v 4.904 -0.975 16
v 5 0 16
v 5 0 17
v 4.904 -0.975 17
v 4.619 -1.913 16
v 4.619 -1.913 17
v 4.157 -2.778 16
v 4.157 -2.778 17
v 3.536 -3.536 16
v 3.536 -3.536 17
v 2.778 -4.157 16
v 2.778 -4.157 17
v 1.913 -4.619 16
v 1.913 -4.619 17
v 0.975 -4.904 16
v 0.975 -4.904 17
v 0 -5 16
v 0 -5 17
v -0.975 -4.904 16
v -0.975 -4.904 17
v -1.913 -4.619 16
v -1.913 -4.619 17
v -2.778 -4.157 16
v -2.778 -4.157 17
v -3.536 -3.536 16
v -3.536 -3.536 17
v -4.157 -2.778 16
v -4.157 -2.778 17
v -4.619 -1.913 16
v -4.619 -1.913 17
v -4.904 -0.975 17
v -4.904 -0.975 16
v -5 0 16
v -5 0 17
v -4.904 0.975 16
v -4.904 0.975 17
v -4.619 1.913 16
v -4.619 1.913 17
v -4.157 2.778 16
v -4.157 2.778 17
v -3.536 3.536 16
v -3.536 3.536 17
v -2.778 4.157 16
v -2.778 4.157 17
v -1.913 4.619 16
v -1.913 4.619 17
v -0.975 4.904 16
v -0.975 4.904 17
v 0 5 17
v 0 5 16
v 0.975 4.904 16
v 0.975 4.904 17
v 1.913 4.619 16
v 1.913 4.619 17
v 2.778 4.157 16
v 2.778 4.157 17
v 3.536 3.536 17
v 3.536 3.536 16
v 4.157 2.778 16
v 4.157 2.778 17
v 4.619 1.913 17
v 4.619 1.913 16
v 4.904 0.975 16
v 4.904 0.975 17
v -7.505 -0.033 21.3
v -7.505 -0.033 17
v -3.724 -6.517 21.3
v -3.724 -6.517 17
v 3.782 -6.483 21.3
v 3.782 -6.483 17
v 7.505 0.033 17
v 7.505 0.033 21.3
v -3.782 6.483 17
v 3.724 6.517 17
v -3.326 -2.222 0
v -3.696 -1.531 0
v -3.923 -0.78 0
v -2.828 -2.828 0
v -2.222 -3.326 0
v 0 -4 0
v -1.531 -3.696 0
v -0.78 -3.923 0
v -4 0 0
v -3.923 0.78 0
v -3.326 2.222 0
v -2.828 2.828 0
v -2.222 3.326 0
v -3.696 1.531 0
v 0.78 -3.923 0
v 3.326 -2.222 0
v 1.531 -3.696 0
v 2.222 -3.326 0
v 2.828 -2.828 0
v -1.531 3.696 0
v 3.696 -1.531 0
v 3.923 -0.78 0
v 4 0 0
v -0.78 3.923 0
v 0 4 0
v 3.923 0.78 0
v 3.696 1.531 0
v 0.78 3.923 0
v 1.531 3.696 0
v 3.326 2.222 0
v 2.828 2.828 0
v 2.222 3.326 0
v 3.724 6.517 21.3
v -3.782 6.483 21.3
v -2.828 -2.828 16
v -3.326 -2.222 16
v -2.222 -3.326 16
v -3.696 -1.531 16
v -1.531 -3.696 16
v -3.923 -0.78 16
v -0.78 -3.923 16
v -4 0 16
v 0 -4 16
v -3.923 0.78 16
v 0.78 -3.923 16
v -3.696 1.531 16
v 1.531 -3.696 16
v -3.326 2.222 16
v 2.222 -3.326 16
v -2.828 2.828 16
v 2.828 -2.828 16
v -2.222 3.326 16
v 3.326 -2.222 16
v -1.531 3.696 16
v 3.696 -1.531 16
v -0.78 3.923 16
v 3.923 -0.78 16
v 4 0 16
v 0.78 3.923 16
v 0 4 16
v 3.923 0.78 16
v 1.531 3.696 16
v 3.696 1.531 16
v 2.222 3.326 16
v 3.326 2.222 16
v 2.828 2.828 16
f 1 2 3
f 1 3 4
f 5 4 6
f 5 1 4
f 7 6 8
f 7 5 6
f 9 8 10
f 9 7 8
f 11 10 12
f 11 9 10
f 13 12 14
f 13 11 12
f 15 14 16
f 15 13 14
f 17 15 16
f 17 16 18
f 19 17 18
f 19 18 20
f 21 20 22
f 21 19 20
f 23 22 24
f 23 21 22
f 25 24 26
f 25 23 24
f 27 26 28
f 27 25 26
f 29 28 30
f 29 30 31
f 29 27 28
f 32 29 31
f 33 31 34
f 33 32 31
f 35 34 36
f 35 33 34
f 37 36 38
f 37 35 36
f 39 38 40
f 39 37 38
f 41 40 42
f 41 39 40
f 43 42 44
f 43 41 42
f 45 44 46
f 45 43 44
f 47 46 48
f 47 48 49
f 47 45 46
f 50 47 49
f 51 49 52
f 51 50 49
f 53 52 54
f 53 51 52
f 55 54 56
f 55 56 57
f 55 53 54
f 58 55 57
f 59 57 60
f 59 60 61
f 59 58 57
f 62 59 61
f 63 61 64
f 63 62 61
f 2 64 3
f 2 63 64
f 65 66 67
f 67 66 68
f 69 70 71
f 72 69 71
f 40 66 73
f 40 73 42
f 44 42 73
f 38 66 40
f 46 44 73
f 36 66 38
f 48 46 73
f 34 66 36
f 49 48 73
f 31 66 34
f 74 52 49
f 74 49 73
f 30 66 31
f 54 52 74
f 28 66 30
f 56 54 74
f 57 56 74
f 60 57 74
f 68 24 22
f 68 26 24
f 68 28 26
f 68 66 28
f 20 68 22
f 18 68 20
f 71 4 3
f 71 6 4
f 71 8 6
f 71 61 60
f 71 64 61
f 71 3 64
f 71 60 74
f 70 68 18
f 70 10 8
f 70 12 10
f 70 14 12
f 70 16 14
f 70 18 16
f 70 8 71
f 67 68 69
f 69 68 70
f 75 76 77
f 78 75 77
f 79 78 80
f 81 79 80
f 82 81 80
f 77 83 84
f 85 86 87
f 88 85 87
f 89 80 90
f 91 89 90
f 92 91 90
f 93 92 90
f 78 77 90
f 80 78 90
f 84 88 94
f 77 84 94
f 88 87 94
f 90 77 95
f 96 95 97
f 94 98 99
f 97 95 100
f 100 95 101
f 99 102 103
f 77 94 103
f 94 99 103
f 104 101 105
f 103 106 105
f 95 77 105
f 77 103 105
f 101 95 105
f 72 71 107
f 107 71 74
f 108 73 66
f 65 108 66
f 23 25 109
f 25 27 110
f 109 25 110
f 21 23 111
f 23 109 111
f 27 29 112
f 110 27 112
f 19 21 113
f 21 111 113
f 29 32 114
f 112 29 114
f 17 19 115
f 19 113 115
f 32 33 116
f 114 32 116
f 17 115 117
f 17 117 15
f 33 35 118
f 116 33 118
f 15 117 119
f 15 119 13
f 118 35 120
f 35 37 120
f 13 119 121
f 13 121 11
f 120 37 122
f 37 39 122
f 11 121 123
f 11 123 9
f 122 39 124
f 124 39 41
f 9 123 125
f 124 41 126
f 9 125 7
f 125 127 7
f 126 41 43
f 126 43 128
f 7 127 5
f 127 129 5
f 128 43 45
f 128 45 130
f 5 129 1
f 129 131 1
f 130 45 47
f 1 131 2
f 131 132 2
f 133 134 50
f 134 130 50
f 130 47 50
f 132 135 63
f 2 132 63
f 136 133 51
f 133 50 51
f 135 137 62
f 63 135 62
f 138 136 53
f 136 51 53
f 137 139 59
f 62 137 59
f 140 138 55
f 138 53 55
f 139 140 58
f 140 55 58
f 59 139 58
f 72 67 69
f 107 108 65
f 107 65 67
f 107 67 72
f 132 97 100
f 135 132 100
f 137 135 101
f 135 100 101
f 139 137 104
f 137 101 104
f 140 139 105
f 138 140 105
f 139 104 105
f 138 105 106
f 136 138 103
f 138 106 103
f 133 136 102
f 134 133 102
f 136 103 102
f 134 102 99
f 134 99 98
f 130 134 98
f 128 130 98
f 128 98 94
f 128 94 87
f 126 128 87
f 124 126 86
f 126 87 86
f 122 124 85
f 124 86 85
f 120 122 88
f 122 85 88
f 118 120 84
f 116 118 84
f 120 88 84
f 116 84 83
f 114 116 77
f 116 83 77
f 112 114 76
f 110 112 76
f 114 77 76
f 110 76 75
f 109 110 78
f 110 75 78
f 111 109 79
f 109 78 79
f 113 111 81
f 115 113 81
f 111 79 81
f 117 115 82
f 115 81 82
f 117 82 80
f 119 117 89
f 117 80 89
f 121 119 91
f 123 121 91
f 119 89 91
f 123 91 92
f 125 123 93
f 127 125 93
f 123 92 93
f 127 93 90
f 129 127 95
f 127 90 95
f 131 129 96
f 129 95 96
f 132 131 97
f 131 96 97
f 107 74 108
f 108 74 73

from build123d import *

# Parameters (mm, degrees)
F0_R     = 4
F1_DEPTH = 16
F3_DEPTH = 5.3
F4_R     = 5
F5_DEPTH = 1


with BuildPart() as f1:
    # F0 (on Top) → F1 (new body)
    with BuildSketch(Plane.XY):
        Circle(F0_R)
    extrude(amount=F1_DEPTH)

    # F2 (on face) → F3 (join)
    with BuildSketch(Plane.XY.offset(16)):
        Polygon((3.781678, -6.483228), (7.505479, 0.033416), (3.723801, 6.516643), (-3.781678, 6.483228), (-7.505479, -0.033416), (-3.723801, -6.516643), align=None)
    extrude(amount=F3_DEPTH)

    # F4 (on face) → F5 (cut)
    with BuildSketch(Plane(origin=(0, 0, 16), x_dir=(1, 0, 0), z_dir=(0, 0, -1))):
        Polygon((3.723801, -6.516643), (7.505479, -0.033416), (3.781678, 6.483228), (-3.723801, 6.516643), (-7.505479, 0.033416), (-3.781678, -6.483228), align=None)
        Circle(F4_R, mode=Mode.SUBTRACT)
    extrude(amount=-F5_DEPTH, mode=Mode.SUBTRACT)


solid = f1.part
